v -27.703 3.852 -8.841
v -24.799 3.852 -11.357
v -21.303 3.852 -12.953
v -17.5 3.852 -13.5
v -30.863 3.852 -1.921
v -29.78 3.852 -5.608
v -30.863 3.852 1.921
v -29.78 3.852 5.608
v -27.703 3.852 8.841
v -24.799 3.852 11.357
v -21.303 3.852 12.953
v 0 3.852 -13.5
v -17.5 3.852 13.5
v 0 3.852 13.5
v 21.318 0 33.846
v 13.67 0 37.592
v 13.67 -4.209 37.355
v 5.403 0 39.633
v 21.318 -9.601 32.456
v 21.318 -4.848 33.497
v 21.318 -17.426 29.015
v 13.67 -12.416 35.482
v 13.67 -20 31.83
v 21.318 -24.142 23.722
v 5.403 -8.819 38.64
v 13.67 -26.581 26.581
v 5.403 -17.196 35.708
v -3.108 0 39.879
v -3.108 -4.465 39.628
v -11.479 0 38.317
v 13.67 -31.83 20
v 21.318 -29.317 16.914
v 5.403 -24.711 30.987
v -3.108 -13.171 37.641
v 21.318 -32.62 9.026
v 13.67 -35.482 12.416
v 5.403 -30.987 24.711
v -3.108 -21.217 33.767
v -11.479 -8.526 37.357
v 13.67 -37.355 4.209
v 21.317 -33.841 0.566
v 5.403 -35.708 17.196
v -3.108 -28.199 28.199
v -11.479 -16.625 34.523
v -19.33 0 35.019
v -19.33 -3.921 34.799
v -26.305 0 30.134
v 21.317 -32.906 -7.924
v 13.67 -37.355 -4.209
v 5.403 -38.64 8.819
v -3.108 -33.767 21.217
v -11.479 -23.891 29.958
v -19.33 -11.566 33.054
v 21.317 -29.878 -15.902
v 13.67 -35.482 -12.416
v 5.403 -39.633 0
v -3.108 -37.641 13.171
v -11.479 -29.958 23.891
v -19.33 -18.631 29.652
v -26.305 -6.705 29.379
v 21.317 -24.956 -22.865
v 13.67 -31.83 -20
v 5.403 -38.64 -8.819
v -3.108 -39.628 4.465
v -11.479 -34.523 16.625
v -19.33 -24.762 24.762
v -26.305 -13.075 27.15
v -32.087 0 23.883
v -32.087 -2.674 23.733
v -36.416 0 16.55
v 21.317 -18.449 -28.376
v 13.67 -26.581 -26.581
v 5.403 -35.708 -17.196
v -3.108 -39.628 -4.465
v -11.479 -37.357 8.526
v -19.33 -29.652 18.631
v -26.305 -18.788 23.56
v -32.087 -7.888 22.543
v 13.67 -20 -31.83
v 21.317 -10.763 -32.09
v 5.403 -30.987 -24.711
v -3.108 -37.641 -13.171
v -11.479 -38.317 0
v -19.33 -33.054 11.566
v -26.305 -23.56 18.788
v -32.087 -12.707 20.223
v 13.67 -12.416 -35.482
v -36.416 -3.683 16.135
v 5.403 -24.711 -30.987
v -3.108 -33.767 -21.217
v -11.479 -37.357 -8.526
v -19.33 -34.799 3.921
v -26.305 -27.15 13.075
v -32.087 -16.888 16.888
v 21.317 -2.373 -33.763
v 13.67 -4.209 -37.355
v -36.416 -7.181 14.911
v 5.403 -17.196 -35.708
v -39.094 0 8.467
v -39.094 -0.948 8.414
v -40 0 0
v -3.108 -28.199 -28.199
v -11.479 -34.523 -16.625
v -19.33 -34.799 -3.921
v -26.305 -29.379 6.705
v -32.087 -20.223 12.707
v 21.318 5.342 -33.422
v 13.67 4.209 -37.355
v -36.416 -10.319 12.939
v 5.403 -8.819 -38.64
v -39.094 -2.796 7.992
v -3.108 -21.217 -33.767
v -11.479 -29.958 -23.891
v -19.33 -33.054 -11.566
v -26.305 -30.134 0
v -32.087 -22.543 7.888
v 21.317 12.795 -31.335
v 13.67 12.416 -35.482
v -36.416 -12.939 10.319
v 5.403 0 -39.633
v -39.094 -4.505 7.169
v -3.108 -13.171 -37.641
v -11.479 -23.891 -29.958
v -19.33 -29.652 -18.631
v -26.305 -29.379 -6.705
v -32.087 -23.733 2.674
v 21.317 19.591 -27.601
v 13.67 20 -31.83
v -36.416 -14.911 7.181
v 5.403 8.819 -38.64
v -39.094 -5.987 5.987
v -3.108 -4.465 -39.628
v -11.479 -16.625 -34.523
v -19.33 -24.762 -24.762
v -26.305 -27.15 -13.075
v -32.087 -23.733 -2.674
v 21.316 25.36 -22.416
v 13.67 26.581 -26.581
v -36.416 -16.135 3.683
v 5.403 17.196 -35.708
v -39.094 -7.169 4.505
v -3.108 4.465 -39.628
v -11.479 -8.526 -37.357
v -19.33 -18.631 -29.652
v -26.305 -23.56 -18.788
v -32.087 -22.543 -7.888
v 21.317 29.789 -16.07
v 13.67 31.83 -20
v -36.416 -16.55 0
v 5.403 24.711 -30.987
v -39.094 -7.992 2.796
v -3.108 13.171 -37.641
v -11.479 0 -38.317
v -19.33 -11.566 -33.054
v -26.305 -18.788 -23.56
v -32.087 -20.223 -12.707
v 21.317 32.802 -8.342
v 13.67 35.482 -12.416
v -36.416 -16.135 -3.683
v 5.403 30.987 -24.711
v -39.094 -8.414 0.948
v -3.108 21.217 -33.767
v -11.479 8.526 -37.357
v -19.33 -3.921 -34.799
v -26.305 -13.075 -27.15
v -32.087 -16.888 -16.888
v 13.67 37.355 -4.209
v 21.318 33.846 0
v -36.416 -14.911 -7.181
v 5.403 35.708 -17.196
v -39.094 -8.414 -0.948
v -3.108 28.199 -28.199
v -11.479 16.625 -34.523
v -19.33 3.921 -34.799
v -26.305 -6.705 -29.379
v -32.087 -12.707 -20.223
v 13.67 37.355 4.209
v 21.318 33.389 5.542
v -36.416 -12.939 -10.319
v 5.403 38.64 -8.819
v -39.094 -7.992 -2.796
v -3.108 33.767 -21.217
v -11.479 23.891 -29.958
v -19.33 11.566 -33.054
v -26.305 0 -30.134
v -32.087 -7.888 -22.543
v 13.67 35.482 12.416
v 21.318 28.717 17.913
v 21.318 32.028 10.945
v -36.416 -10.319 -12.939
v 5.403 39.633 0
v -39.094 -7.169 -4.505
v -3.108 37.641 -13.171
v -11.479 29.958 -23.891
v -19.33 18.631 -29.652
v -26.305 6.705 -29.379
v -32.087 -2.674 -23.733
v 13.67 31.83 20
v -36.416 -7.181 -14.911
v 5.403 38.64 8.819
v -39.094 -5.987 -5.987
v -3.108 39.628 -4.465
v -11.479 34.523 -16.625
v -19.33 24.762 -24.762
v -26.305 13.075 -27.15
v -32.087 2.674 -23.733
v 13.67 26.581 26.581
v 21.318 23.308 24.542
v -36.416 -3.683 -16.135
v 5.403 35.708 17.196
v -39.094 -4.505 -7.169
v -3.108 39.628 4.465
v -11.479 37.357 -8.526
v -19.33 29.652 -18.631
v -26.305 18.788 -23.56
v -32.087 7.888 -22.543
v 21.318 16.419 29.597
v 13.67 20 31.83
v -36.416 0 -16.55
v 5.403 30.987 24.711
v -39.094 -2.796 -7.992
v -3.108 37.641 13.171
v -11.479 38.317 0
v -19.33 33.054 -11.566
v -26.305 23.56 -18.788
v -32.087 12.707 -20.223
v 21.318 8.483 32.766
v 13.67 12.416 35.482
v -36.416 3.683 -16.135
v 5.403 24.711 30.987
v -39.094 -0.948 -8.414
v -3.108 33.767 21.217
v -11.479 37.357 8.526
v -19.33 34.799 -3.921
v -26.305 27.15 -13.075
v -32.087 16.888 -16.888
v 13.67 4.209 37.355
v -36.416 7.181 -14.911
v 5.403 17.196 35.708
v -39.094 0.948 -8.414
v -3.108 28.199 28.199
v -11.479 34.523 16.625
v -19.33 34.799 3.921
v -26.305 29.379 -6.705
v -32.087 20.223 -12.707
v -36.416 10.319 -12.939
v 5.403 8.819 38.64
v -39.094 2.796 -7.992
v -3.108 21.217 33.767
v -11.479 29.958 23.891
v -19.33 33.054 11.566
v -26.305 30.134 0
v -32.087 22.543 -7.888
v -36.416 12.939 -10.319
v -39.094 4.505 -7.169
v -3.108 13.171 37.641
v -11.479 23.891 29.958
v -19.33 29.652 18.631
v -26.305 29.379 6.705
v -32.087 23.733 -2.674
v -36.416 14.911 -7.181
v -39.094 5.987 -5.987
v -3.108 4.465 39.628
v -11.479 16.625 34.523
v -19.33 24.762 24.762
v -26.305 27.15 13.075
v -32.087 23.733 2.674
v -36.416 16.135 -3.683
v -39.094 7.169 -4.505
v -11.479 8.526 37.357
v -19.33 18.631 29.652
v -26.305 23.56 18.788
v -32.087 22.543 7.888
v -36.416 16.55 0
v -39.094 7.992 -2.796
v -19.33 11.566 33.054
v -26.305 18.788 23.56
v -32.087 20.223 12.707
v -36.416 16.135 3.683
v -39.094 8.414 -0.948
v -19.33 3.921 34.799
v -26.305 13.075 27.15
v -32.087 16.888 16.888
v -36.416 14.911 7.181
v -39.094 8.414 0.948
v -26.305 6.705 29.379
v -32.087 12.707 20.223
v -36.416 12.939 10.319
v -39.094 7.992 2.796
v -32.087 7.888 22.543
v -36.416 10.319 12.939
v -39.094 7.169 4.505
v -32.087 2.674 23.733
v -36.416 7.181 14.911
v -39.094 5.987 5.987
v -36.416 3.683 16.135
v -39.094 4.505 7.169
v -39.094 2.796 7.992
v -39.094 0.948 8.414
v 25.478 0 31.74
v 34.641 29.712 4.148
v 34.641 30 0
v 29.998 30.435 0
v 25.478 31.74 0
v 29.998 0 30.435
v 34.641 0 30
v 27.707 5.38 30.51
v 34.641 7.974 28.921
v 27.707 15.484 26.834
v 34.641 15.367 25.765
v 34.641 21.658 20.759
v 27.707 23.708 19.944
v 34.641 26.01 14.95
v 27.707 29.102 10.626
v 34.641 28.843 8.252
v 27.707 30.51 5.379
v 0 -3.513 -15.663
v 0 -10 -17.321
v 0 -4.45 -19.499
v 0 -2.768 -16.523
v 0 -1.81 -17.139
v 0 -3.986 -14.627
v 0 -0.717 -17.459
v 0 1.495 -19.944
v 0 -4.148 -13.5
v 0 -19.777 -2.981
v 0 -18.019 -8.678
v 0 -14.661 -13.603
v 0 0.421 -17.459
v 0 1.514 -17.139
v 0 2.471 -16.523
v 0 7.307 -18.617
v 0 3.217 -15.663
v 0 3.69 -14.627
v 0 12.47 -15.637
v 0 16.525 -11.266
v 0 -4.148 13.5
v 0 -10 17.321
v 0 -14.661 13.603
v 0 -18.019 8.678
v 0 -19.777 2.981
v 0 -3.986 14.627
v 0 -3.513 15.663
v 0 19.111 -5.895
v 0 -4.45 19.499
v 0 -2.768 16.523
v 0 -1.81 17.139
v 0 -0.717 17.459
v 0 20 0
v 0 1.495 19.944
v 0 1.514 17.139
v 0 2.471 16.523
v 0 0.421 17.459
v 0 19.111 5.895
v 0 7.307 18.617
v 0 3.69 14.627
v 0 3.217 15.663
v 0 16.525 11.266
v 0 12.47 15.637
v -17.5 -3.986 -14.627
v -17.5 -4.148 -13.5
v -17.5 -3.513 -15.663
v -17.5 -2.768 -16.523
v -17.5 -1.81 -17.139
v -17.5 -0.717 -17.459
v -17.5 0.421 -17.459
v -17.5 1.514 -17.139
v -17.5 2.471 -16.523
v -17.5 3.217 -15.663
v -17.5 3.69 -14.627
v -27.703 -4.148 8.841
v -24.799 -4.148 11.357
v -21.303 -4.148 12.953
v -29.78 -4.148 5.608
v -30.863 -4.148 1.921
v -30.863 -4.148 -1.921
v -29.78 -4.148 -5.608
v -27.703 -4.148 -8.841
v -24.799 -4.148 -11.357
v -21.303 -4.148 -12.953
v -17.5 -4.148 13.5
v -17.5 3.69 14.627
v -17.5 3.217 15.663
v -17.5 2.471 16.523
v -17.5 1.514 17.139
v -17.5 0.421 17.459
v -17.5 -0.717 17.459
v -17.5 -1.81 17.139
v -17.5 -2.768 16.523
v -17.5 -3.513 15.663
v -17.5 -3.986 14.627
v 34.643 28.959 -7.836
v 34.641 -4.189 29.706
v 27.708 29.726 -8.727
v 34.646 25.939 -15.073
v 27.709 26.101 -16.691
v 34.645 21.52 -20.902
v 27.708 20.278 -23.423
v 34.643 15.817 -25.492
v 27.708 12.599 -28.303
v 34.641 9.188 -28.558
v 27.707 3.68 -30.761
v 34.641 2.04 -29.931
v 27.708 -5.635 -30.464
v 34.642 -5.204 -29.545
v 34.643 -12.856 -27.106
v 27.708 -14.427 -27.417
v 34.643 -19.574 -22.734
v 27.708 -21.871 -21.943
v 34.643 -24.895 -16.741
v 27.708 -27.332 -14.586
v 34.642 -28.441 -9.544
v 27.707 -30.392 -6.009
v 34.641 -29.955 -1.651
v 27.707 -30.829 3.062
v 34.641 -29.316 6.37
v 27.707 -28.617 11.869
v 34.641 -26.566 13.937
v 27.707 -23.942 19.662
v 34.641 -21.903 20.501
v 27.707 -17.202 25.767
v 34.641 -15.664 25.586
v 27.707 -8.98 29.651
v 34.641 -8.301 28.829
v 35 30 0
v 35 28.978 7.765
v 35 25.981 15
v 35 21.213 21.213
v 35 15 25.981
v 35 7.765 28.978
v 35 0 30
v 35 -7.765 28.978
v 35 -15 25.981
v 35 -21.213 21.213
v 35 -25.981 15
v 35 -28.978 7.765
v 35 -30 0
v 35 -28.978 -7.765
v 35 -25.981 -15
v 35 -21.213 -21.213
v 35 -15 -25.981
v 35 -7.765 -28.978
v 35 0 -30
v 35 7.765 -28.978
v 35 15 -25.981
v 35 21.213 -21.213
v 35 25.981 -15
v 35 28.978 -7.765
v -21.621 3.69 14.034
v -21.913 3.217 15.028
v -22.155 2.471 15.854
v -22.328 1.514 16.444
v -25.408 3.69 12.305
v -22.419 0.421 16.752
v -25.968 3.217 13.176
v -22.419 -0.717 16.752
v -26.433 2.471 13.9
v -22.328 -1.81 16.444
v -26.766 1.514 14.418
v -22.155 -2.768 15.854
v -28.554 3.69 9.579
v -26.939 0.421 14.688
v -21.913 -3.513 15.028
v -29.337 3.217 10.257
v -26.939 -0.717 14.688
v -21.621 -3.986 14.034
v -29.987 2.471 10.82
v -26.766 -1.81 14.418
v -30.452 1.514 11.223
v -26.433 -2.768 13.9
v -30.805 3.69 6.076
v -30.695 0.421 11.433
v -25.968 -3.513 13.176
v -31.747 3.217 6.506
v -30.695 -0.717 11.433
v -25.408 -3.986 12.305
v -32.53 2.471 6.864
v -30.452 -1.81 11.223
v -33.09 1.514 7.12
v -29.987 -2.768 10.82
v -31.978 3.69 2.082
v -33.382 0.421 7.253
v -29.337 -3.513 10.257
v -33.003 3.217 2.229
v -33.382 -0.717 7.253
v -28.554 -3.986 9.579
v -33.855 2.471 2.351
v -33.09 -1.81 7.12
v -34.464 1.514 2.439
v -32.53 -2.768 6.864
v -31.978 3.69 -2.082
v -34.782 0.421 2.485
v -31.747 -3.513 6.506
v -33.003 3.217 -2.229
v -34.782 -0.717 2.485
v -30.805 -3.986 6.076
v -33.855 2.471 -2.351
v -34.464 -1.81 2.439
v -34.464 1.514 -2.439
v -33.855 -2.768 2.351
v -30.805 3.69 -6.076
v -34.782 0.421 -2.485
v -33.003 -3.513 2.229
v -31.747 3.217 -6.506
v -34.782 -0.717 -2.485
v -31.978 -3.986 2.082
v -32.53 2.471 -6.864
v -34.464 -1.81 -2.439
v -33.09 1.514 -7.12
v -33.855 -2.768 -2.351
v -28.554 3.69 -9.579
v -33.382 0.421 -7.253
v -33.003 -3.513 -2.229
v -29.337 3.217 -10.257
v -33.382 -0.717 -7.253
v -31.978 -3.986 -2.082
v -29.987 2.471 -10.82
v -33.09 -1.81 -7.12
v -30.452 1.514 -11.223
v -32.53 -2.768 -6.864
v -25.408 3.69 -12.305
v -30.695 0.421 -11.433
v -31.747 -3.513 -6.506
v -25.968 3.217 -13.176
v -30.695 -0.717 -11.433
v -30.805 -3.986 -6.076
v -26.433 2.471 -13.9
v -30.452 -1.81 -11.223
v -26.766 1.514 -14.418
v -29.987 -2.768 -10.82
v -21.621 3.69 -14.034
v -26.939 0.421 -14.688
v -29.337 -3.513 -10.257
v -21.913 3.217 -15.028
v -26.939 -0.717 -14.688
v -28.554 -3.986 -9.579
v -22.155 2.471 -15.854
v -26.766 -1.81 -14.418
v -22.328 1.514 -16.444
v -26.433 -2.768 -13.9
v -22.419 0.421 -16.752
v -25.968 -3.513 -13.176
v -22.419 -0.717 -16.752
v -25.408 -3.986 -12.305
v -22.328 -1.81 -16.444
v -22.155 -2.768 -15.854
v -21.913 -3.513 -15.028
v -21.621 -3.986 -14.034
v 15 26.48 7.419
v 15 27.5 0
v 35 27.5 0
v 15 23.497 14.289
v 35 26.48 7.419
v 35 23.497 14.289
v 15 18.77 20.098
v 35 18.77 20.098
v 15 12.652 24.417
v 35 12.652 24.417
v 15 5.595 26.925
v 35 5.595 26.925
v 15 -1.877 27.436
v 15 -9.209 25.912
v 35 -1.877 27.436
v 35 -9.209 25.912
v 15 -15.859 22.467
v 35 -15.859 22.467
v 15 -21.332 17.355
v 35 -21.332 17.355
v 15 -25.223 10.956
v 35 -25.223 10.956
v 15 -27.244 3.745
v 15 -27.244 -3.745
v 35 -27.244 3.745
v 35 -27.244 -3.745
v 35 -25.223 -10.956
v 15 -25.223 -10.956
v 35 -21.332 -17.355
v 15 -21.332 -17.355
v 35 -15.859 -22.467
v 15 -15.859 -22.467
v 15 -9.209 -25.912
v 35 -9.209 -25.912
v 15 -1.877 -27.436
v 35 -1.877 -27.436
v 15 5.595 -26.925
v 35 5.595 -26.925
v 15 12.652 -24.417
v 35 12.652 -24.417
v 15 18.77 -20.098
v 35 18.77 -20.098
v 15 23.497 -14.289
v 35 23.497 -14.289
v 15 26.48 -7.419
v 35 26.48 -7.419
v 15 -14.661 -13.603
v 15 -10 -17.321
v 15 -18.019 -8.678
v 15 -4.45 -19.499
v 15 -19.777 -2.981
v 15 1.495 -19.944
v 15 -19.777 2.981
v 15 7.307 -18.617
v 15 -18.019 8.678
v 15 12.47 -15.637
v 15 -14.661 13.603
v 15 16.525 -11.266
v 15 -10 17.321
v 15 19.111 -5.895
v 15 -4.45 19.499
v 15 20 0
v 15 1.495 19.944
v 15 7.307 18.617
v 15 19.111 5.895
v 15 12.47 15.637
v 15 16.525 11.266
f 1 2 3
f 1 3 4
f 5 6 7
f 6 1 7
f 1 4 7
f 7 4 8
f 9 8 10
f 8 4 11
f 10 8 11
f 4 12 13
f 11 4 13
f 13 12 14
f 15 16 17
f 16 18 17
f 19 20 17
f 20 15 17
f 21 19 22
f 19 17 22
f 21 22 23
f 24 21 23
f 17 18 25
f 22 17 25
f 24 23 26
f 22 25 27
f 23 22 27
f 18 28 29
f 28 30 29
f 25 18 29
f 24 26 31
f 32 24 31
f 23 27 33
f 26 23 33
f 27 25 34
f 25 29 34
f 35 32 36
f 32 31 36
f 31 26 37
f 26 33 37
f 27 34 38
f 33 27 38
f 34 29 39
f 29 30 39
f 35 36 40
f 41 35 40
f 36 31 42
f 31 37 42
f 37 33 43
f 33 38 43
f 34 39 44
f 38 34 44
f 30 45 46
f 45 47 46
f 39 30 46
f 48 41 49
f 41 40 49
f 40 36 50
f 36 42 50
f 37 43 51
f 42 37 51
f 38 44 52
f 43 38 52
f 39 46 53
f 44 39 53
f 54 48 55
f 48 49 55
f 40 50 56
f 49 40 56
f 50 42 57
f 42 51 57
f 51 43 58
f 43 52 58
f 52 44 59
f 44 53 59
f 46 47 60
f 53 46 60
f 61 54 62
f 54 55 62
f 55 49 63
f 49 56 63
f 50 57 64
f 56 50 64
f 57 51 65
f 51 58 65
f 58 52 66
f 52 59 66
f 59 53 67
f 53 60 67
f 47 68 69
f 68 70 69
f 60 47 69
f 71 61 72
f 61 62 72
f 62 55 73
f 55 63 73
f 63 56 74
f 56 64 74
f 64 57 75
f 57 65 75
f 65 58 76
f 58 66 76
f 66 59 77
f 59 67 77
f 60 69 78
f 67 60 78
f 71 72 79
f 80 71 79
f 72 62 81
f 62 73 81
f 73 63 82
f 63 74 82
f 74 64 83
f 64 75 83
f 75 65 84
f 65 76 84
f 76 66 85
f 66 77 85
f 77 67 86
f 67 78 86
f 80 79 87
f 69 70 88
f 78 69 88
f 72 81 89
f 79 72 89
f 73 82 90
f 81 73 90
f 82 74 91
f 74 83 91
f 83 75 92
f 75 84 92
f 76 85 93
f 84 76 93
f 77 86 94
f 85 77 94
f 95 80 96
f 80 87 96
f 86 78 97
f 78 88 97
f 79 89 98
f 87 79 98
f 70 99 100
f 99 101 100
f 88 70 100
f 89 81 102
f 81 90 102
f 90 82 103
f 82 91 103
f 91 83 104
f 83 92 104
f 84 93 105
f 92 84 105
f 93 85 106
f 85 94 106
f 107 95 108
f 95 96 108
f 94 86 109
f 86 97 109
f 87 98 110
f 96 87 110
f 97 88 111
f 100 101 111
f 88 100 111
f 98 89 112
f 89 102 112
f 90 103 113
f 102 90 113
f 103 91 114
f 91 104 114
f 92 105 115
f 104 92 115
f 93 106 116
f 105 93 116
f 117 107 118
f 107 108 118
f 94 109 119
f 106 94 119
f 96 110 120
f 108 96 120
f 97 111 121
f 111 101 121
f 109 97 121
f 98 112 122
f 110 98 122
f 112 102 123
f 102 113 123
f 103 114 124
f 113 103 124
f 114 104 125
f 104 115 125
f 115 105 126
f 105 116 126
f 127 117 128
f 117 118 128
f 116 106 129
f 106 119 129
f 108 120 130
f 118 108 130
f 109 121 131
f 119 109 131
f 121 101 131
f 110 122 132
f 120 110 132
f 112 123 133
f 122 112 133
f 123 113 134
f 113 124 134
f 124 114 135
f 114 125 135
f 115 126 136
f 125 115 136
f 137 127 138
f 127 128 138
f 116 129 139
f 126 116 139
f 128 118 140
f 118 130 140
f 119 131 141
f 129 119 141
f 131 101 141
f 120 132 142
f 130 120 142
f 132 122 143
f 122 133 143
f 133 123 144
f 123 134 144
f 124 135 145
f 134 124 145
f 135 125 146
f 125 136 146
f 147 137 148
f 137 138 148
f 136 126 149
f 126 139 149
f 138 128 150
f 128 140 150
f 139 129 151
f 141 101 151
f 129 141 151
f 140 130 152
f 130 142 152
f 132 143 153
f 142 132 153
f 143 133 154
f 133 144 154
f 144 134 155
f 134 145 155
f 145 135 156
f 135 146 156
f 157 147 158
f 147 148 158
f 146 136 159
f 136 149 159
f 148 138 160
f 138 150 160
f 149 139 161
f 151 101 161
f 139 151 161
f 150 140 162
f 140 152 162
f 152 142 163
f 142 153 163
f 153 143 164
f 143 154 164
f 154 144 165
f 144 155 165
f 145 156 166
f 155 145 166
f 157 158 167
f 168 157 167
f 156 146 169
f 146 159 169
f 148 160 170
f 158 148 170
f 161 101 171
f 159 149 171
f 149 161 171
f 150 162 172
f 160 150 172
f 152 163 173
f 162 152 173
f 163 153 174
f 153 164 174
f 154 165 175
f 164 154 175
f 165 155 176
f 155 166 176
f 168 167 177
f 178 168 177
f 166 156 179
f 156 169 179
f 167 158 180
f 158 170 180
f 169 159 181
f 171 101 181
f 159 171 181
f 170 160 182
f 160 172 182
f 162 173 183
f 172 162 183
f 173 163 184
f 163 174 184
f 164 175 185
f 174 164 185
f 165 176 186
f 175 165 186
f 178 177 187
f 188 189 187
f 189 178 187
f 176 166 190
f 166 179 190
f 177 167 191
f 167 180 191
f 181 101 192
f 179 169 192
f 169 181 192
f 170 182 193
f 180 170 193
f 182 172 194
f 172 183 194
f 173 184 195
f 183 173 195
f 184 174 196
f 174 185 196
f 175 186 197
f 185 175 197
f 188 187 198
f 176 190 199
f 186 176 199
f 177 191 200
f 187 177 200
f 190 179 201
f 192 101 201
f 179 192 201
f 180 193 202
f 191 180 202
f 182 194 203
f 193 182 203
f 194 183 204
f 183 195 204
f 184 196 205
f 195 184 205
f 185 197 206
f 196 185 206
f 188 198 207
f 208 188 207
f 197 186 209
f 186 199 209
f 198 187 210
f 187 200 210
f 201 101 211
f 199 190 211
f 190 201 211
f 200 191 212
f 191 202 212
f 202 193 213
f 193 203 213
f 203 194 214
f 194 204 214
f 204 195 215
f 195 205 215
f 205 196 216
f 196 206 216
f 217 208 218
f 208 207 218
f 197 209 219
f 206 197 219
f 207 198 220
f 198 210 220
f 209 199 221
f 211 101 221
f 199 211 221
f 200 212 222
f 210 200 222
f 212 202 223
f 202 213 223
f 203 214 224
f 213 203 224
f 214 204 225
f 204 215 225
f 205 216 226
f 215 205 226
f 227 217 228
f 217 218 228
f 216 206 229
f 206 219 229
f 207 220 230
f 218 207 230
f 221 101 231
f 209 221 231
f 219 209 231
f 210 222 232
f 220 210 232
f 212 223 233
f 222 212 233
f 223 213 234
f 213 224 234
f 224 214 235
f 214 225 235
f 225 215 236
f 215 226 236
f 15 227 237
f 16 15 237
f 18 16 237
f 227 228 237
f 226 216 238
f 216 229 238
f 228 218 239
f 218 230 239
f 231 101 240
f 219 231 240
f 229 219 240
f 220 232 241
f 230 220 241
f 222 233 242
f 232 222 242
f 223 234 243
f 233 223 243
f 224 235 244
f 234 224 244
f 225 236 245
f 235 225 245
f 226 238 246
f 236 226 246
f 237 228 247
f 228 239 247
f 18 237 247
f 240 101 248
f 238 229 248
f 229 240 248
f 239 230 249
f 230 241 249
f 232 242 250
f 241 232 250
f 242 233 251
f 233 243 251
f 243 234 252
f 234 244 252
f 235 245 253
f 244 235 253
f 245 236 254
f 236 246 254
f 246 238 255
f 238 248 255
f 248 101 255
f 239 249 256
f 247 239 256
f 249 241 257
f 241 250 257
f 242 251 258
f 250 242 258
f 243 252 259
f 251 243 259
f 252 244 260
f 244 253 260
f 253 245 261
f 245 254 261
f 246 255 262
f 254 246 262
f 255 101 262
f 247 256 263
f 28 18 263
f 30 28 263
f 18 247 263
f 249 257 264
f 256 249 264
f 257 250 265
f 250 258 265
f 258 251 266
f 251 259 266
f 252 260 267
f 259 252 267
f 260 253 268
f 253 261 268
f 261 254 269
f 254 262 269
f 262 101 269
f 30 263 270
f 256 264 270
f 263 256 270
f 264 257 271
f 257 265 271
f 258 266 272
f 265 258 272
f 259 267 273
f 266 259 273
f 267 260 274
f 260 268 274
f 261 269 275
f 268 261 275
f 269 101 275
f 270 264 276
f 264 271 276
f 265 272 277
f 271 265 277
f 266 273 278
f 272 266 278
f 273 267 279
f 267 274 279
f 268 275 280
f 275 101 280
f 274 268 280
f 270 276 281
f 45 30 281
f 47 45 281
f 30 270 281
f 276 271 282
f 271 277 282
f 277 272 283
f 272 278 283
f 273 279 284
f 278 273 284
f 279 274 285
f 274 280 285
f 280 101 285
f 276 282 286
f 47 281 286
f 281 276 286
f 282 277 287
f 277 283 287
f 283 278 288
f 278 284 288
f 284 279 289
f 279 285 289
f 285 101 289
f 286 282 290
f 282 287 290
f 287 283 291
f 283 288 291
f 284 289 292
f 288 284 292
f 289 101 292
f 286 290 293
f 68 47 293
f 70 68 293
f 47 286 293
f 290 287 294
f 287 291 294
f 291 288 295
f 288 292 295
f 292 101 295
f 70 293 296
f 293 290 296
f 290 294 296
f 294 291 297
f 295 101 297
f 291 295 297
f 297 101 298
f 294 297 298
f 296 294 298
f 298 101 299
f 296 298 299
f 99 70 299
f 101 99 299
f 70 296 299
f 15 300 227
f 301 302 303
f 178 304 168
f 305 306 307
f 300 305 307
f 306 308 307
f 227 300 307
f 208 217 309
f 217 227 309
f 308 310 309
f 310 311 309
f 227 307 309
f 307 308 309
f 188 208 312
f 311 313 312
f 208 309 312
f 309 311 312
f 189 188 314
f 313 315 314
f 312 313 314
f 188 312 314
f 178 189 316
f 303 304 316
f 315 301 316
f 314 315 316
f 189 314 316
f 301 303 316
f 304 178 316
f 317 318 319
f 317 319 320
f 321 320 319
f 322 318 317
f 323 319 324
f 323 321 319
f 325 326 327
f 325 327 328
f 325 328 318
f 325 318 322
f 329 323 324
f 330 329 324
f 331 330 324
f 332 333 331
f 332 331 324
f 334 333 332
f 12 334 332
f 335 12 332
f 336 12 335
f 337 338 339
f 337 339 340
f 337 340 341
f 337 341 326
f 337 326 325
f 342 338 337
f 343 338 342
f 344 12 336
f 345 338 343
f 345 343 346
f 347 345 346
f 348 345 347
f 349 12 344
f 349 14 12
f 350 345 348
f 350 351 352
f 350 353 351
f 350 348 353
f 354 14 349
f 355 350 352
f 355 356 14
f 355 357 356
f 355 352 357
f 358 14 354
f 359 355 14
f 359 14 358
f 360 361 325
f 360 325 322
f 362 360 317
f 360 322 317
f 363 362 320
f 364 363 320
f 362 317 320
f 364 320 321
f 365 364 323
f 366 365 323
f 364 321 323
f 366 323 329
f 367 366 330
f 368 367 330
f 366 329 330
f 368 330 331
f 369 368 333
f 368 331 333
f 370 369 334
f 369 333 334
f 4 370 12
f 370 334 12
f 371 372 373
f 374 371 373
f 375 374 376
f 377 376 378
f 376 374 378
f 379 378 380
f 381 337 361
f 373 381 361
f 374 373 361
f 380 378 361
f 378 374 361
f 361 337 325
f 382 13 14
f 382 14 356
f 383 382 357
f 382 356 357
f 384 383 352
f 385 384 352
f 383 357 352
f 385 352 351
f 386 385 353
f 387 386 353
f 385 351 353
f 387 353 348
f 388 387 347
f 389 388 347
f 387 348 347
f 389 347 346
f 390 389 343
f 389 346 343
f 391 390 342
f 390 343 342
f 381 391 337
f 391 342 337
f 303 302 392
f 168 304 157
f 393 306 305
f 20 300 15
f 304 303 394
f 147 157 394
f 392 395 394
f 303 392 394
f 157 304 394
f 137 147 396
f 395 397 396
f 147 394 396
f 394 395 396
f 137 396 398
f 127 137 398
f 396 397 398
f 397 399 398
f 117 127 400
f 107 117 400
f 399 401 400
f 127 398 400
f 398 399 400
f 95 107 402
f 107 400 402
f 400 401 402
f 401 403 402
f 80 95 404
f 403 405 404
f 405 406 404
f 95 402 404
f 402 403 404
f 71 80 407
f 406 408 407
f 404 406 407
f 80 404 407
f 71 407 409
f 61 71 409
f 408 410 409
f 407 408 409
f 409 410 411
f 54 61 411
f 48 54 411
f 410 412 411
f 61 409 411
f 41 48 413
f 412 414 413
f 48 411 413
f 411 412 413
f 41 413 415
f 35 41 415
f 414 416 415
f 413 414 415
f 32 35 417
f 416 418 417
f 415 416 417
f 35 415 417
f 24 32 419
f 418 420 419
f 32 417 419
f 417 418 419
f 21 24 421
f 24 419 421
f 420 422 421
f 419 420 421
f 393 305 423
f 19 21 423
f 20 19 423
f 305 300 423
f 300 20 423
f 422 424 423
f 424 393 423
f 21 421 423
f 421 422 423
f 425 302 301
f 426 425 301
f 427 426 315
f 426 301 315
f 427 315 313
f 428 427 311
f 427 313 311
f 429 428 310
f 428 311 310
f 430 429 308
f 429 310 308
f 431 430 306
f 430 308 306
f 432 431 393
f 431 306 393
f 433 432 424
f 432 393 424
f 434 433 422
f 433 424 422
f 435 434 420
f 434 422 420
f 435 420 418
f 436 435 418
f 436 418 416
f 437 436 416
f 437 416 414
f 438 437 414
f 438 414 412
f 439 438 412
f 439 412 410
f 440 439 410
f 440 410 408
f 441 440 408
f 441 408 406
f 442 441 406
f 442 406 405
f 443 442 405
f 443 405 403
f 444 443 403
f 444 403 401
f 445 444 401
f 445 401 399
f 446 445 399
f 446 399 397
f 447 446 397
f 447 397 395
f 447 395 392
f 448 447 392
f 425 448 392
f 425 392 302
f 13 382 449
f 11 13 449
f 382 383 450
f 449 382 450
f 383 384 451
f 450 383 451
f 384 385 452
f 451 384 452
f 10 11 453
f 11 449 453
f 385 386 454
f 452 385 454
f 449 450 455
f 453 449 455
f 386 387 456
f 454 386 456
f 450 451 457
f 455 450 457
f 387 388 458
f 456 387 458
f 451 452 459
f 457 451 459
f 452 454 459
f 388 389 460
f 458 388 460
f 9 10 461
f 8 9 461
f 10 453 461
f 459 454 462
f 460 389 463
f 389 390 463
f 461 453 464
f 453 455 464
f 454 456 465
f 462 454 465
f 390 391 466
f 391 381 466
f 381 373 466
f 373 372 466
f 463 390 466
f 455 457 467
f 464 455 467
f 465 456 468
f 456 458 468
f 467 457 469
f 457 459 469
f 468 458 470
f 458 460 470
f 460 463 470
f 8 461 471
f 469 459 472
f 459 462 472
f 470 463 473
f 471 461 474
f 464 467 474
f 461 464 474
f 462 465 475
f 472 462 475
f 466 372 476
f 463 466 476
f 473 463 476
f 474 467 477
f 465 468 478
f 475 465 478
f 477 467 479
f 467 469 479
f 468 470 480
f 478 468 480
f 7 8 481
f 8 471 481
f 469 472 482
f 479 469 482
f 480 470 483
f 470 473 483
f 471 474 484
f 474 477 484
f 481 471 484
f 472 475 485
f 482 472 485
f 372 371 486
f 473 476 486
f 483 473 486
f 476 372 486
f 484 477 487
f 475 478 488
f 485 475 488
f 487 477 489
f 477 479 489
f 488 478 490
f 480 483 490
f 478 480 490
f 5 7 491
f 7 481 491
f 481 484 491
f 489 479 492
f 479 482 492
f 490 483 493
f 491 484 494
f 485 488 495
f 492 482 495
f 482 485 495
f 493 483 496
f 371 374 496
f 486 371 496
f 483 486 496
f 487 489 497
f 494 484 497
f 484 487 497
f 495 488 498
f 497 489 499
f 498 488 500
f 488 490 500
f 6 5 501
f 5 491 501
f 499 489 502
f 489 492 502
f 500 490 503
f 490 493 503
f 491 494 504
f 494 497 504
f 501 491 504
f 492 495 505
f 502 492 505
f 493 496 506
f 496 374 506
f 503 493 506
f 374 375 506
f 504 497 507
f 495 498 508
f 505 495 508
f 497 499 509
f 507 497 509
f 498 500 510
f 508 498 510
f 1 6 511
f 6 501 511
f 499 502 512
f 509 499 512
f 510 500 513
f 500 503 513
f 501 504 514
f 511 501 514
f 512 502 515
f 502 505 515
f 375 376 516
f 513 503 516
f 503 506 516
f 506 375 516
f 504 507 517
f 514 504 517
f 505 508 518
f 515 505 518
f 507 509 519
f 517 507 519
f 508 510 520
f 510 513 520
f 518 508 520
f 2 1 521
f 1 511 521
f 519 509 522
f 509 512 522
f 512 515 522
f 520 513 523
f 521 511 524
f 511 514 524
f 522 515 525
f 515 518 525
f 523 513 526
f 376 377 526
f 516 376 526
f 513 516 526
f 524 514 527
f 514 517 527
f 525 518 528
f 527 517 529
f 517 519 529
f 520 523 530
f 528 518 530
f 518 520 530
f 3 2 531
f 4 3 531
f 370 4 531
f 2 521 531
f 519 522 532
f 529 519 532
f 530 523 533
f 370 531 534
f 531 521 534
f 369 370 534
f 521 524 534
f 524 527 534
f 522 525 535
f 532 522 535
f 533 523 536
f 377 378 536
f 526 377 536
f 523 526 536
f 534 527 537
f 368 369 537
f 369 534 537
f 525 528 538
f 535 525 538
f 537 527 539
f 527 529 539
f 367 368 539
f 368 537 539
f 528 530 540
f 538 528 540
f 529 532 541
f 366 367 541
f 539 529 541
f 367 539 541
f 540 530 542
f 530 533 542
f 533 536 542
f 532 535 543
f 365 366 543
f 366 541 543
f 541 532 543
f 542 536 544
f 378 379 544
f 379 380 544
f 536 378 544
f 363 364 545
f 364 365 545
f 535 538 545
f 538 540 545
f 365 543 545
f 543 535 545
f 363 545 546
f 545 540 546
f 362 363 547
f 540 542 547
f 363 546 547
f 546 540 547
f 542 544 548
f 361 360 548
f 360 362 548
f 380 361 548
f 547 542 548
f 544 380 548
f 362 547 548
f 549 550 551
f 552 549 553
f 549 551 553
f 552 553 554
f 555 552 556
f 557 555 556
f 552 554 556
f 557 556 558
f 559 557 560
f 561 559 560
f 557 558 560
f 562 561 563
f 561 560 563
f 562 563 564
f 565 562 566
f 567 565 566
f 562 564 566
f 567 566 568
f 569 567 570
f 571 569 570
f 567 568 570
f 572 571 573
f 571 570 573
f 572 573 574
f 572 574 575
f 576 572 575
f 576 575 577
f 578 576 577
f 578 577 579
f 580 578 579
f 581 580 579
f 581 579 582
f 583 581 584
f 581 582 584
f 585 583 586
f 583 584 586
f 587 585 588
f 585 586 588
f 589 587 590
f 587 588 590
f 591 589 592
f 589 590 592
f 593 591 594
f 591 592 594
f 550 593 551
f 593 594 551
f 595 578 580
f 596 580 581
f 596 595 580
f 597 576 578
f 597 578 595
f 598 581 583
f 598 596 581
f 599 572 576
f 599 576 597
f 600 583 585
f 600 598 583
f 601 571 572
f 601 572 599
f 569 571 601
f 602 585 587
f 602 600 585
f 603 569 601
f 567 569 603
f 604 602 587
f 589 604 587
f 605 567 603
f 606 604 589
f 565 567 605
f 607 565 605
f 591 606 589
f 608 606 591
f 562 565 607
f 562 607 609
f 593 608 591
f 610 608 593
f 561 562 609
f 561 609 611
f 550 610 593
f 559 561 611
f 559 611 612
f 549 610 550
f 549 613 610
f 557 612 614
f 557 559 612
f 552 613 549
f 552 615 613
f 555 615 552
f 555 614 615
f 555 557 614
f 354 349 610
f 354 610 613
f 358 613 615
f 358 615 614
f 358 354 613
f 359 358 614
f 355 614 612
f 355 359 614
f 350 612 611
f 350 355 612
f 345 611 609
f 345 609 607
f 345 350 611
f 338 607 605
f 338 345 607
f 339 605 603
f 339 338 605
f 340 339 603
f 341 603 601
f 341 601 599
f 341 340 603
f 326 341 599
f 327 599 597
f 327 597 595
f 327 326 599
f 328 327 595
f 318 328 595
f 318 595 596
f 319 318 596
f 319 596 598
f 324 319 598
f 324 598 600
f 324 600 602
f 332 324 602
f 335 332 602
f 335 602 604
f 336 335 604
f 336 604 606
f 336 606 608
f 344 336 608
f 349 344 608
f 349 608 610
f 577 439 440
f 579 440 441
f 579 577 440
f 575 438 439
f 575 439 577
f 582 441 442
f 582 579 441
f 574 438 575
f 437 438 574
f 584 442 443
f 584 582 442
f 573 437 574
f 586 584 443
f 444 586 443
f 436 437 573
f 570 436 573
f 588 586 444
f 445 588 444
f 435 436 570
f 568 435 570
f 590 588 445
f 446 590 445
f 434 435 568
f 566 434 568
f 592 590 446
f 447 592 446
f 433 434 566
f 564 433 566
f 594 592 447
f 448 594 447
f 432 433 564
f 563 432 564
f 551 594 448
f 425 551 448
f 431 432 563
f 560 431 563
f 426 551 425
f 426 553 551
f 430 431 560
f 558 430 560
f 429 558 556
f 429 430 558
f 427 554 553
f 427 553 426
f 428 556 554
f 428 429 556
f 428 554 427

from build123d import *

# Parameters (mm, degrees)
F2_R      = 20
F3_DEPTH  = 61.6
F5_R      = 30
F5_R_2    = 20
F6_DEPTH  = 35
F7_R      = 27.5
F7_R_2    = 20
F8_DEPTH  = 20
F9_R      = 25
F10_W     = 8
F10_H     = 13.5
F11_DEPTH = 17.5
F12_W     = 8
F12_H     = 13.5


with BuildPart() as f1:
    # F0 (on Front) → F1 (revolve)
    with BuildSketch(Plane.XZ):
        with BuildLine():
            ThreePointArc((40, 0), (0, 40), (-40, 0))
            Line((-40, 0), (40, 0))
        make_face()
    revolve(axis=Axis((0, 0, 0), (1, 0, 0)))

    # F2 (on Right) → F3 (cut)
    with BuildSketch(Plane.YZ):
        Circle(F2_R)
    extrude(amount=F3_DEPTH, mode=Mode.SUBTRACT)

    # F5 (on Right) → F6 (join)
    with BuildSketch(Plane.YZ):
        Circle(F5_R)
        Circle(F5_R_2, mode=Mode.SUBTRACT)
    extrude(amount=F6_DEPTH)

    # F7 (on face) → F8 (cut)
    with BuildSketch(Plane.YZ.offset(35)):
        Circle(F7_R)
        Circle(F7_R_2, mode=Mode.SUBTRACT)
    extrude(amount=-F8_DEPTH, mode=Mode.SUBTRACT)

    # F9
    f9_edges = [f1.edges().sort_by_distance(p)[0] for p in [
        (26.457513, 21.213203, 21.213203),
        (26.457513, -21.213203, -21.213203),
    ]]
    fillet(f9_edges, radius=F9_R)

    # F10 (on face) → F11 (cut)
    with BuildSketch(Plane.YZ):
        with BuildLine():
            ThreePointArc((3.8518622015, 13.5), (-0.1481377985, 17.5), (-4.1481377985, 13.5))
            Line((-4.1481377985, 13.5), (3.8518622015, 13.5))
        make_face()
        with Locations((-0.1481377985, 6.75)):
            Rectangle(F10_W, F10_H)
        with Locations((-0.1481377985, -6.75)):
            Rectangle(F10_W, F10_H)
        with BuildLine():
            Line((3.8518622015, -13.5), (-4.1481377985, -13.5))
            ThreePointArc((-4.1481377985, -13.5), (-0.1481377985, -17.5), (3.8518622015, -13.5))
        make_face()
    extrude(amount=-F11_DEPTH, mode=Mode.SUBTRACT)

    # F12 (on face) → F13 (revolve, cut)
    with BuildSketch(Plane.YZ.offset(-17.5)):
        with BuildLine():
            ThreePointArc((3.8518622015, 13.5), (-0.1481377985, 17.5), (-4.1481377985, 13.5))
            Line((-4.1481377985, 13.5), (3.8518622015, 13.5))
        make_face()
        with Locations((-0.1481377985, 6.75)):
            Rectangle(F12_W, F12_H)
    revolve(axis=Axis((-17.5, -0.1481377985, 0), (0, -1, 0)), mode=Mode.SUBTRACT)


solid = f1.part
